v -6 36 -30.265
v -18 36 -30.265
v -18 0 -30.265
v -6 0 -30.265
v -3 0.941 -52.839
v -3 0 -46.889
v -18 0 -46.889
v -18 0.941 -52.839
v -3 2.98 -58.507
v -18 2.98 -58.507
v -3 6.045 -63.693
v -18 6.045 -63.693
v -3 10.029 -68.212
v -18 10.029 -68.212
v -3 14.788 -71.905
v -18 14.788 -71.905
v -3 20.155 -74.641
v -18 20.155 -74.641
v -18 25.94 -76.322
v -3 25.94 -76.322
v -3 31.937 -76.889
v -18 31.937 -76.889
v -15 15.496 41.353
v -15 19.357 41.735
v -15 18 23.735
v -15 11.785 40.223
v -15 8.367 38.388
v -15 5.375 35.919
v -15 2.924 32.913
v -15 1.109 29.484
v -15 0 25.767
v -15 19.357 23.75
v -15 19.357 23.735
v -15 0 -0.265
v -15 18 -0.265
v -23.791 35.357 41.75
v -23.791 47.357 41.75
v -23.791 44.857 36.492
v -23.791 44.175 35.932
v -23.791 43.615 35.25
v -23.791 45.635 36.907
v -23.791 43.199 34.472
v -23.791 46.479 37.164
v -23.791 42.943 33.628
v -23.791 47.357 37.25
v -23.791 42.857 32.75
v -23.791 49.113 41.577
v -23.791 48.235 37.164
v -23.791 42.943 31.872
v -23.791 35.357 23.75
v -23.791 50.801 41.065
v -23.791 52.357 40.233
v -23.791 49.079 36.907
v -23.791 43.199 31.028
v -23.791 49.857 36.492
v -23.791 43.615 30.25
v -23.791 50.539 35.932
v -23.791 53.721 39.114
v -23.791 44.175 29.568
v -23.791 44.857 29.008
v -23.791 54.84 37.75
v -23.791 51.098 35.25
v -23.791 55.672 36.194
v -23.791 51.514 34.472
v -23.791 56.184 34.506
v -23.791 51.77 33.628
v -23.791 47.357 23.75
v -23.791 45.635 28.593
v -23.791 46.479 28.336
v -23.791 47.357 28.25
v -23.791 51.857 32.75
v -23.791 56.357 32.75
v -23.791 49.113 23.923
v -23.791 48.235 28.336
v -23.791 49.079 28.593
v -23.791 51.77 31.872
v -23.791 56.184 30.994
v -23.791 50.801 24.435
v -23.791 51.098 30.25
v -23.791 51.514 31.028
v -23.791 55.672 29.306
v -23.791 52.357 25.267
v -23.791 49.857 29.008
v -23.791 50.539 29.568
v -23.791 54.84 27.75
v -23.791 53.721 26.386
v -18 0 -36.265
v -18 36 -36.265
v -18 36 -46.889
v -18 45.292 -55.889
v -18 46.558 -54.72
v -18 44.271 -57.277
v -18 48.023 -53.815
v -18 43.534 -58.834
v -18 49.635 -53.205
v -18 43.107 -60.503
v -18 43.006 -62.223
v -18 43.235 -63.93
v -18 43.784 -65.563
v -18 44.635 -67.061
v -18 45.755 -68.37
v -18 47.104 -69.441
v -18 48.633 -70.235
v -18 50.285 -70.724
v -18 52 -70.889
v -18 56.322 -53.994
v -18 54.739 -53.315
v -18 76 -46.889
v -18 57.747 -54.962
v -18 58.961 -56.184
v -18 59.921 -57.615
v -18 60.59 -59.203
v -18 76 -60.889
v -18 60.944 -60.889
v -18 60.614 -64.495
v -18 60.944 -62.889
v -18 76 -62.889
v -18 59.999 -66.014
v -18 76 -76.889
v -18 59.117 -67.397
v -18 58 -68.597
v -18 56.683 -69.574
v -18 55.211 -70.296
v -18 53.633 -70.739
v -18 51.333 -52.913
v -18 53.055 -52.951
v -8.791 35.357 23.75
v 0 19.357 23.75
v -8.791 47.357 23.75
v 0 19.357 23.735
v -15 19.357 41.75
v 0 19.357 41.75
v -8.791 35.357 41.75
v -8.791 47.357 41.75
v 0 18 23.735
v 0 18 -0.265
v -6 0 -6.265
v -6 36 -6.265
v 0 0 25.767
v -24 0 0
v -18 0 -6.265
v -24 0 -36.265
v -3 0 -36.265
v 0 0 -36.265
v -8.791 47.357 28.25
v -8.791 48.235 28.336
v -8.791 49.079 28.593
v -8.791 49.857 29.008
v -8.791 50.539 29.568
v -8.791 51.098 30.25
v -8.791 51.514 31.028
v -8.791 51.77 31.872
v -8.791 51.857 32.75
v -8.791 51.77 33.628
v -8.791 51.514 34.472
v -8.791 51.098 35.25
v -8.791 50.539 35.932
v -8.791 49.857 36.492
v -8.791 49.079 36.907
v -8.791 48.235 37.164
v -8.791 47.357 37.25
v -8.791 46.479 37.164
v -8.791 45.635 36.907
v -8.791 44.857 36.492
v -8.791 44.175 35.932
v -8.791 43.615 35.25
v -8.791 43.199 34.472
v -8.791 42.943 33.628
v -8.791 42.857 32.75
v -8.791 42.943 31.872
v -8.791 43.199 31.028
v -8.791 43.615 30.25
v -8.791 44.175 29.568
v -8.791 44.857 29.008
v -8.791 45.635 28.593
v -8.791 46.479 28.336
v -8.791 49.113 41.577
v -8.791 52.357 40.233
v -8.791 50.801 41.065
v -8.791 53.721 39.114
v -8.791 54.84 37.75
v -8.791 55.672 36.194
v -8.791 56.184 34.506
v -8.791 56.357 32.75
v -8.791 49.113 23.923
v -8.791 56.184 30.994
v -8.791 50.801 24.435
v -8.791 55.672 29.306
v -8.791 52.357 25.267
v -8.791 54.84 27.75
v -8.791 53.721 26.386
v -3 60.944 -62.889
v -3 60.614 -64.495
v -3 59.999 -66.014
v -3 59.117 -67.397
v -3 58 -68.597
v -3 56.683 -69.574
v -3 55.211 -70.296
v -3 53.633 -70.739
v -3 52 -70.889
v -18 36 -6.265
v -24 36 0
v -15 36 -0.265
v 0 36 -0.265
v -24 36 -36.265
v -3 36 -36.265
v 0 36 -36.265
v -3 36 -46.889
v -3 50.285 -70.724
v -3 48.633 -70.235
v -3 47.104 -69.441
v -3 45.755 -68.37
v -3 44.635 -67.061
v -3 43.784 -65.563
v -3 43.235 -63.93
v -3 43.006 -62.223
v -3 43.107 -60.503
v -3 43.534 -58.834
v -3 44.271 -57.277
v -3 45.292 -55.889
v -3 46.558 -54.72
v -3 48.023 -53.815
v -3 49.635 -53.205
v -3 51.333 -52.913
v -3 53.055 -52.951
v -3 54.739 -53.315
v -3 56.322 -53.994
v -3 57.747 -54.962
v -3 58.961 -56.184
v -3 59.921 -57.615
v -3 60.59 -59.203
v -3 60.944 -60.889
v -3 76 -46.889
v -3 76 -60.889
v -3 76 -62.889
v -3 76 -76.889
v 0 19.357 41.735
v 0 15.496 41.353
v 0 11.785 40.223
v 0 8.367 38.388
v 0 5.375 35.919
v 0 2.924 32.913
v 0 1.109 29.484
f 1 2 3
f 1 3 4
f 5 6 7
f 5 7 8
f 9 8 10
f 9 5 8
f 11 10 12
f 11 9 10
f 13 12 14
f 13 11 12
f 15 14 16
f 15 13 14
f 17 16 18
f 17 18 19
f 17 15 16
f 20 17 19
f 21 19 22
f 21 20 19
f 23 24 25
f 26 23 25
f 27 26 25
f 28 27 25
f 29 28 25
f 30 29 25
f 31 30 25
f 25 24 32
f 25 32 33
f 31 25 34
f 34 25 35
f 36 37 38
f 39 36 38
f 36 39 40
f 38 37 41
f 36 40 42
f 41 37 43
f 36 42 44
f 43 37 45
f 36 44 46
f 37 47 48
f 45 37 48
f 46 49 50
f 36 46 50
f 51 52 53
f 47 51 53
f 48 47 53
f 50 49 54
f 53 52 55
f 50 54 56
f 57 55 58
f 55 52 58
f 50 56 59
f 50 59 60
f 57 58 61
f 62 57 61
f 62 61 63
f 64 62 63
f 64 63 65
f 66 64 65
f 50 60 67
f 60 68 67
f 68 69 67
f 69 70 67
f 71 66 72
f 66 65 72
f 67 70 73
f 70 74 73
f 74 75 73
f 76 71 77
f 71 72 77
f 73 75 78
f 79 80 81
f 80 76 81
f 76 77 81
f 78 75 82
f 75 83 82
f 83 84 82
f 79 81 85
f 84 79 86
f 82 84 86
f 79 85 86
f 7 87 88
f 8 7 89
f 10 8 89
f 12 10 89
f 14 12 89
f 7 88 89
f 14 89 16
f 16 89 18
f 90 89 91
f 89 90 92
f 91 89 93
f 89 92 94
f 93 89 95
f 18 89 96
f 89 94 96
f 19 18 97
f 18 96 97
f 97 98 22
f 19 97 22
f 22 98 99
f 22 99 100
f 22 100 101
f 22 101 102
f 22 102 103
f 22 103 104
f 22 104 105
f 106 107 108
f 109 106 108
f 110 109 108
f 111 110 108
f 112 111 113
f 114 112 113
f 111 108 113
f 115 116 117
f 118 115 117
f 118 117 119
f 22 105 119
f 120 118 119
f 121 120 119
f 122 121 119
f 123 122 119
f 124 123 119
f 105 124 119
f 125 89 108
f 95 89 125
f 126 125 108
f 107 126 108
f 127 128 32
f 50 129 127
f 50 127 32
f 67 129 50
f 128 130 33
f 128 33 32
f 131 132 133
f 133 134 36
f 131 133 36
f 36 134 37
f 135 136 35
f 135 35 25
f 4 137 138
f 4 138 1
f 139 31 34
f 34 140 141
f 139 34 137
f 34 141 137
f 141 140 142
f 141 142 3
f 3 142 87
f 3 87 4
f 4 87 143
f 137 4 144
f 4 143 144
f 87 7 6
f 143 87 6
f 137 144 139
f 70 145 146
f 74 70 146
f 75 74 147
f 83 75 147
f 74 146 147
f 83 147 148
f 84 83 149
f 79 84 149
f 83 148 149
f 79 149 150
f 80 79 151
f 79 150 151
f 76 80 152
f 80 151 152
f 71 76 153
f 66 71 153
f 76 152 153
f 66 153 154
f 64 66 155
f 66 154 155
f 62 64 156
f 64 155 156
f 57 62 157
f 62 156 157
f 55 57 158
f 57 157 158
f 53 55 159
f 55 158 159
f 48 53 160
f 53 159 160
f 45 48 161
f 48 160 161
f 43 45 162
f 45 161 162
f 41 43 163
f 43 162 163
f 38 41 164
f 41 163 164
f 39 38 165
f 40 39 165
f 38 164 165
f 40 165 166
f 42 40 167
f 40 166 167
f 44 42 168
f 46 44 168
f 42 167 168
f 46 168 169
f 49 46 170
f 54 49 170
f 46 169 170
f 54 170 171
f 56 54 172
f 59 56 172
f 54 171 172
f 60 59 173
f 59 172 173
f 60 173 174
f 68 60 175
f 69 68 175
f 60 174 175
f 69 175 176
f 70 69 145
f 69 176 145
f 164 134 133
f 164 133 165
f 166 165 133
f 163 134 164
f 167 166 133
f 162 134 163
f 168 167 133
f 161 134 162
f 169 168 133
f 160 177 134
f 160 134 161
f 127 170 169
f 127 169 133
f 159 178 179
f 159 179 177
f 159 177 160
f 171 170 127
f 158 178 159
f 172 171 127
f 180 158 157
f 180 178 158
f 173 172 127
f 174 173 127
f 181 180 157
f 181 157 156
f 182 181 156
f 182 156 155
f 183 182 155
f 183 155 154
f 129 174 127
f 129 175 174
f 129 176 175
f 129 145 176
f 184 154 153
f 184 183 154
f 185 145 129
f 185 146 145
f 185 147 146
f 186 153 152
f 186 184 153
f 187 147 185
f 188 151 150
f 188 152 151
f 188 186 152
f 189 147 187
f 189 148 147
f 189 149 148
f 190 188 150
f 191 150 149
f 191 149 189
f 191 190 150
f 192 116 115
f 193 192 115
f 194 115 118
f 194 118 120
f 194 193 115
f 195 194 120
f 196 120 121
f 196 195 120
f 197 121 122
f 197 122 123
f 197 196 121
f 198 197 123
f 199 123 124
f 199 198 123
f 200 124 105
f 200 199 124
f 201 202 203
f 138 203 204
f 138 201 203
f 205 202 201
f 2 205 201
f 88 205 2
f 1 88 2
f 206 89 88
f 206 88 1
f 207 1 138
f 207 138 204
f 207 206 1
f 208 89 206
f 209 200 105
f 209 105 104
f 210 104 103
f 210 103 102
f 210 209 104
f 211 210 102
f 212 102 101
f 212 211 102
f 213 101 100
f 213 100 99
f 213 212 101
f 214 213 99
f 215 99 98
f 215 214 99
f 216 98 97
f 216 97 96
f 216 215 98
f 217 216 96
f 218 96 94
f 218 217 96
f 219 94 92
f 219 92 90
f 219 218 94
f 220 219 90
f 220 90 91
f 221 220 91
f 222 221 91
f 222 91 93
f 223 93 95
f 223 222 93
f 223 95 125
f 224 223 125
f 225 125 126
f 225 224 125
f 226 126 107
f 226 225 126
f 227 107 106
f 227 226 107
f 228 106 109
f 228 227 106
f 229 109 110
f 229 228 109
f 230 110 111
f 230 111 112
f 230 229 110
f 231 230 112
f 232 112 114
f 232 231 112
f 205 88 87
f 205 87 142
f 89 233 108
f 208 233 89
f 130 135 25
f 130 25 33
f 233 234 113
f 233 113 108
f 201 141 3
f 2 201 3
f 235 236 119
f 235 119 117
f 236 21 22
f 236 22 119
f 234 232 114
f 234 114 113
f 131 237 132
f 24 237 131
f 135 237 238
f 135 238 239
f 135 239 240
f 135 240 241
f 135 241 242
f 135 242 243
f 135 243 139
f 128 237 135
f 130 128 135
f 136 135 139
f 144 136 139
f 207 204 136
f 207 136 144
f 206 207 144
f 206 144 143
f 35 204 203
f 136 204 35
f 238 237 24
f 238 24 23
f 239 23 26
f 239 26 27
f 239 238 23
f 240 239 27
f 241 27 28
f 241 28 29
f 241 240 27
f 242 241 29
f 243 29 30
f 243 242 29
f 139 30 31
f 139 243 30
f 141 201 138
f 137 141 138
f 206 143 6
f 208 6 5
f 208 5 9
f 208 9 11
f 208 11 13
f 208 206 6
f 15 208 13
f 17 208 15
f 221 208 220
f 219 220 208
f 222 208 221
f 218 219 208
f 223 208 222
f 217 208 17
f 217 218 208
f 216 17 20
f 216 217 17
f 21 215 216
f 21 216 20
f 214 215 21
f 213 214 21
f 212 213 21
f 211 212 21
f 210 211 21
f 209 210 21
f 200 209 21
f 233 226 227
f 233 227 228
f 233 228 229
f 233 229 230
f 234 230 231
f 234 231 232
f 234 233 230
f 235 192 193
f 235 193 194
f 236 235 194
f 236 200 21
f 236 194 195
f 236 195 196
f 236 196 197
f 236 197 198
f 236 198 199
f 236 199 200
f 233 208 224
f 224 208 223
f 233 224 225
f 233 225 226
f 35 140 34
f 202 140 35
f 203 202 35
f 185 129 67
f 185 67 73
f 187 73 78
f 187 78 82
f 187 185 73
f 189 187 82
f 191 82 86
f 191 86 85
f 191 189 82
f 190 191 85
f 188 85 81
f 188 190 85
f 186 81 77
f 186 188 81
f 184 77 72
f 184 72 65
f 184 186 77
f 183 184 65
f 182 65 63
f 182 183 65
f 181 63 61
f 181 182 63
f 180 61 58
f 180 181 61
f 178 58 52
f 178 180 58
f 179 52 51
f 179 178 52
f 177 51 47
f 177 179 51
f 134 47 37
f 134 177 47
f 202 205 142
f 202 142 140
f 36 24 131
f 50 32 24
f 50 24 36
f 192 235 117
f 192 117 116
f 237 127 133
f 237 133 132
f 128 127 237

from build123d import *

# Parameters (mm, degrees)
BOSS_EXTRUDE1_DEPTH = 15
BOSS_EXTRUDE2_DEPTH = 18
BOSS_EXTRUDE3_DEPTH = 15
SKETCH4_R           = 4.5
CUT_EXTRUDE1_DEPTH  = 15
BOSS_EXTRUDE4_DEPTH = 36
SKETCH6_W           = 12
SKETCH6_H           = 24
CUT_EXTRUDE2_DEPTH  = 61.125389812
SKETCH7_W           = 15
SKETCH7_H           = 10.623328836
BOSS_EXTRUDE5_DEPTH = 36
BOSS_EXTRUDE6_DEPTH = 15


with BuildPart() as part:
    # Sketch1 → Boss-Extrude1 (new body)
    with BuildSketch(Plane(origin=(0, 0, 0), x_dir=(0, 0, -1), z_dir=(1, 0, 0))):
        with BuildLine():
            Line((-25.766620498, 0), (36.265250882, 0))
            Line((36.265250882, 0), (36.265250882, 36))
            Line((36.265250882, 36), (0.265250882, 36))
            Line((0.265250882, 36), (0.265250882, 18))
            Line((0.265250882, 18), (-23.734749118, 18))
            Line((-23.734749118, 18), (-23.734749118, 19.356781067))
            Line((-23.734749118, 19.356781067), (-41.734749118, 19.356781067))
            ThreePointArc((-41.734749118, 19.356781067), (-37.227535866, 6.810206785), (-25.766620498, 0))
        make_face()
    extrude(amount=-BOSS_EXTRUDE1_DEPTH)

    # Sketch2 → Boss-Extrude2 (add)
    with BuildSketch(Plane.XY.offset(23.75)):
        Polygon((-15, 19.356781067), (-23.791342675, 35.356781067), (-23.791342675, 47.356781067), (-8.791342675, 47.356781067), (-8.791342675, 35.356781067), (0, 19.356781067), align=None)
    extrude(amount=BOSS_EXTRUDE2_DEPTH)

    # Sketch3 → Boss-Extrude3 (add)
    with BuildSketch(Plane(origin=(-8.791342675, 0, 0), x_dir=(0, 0, -1), z_dir=(1, 0, 0))):
        with BuildLine():
            Line((-41.75, 47.356781067), (-23.75, 47.356781067))
            ThreePointArc((-23.75, 47.356781067), (-32.75, 56.356781067), (-41.75, 47.356781067))
        make_face()
    extrude(amount=-BOSS_EXTRUDE3_DEPTH)

    # Sketch4 → Cut-Extrude1 (cut)
    with BuildSketch(Plane(origin=(-8.791342675, 0, 0), x_dir=(0, 0, -1), z_dir=(1, 0, 0))):
        with Locations((-32.75, 47.356781067)):
            Circle(SKETCH4_R)
    extrude(amount=-CUT_EXTRUDE1_DEPTH, mode=Mode.SUBTRACT)


with BuildPart() as body_2:
    # Sketch5 → Boss-Extrude4 (new body)
    with BuildSketch(Plane(origin=(0, 36, 0), x_dir=(1, 0, 0), z_dir=(0, 1, 0))):
        Polygon((-15, 36.265250882), (-24, 36.265250882), (-24, 0), (-15, 0.265250882), align=None)
    extrude(amount=-BOSS_EXTRUDE4_DEPTH)


with BuildPart() as cut_extrude2_tool:
    # Sketch6 → Cut-Extrude2 (new, through all)
    with BuildSketch(Plane(origin=(0, 36, 0), x_dir=(1, 0, 0), z_dir=(0, 1, 0))):
        with Locations((-12, 18.265250882)):
            Rectangle(SKETCH6_W, SKETCH6_H)
    extrude(amount=-CUT_EXTRUDE2_DEPTH)


with BuildPart() as part_1:
    add(part.part)

    # Cut-Extrude2: cut by cut_extrude2_tool
    add(cut_extrude2_tool.part, mode=Mode.SUBTRACT)



with BuildPart() as body_2_1:
    add(body_2.part)

    # Cut-Extrude2: cut by cut_extrude2_tool
    add(cut_extrude2_tool.part, mode=Mode.SUBTRACT)


with BuildPart() as part_2:
    add(part_1.part)

    add(body_2_1.part)  # Boss-Extrude5 merges body 2
    # Sketch7 → Boss-Extrude5 (add)
    with BuildSketch(Plane(origin=(0, 36, 0), x_dir=(1, 0, 0), z_dir=(0, 1, 0))):
        with Locations((-10.5, 41.5769153)):
            Rectangle(SKETCH7_W, SKETCH7_H)
    extrude(amount=-BOSS_EXTRUDE5_DEPTH)

    # Sketch9 → Boss-Extrude6 (add)
    with BuildSketch(Plane(origin=(-3, 0, 0), x_dir=(0, 0, -1), z_dir=(1, 0, 0))):
        with BuildLine():
            Line((46.888579718, 76), (46.888579718, 36))
            Line((46.888579718, 36), (46.888579718, 0))
            ThreePointArc((46.888579718, 0), (68.212387297, 10.028536545), (76.888579718, 31.937438845))
            Line((76.888579718, 31.937438845), (76.888579718, 76))
            Line((76.888579718, 76), (62.888579718, 76))
            Line((62.888579718, 76), (62.888579718, 60.94427191))
            ThreePointArc((62.888579718, 60.94427191), (68.59678365, 58), (70.888579718, 52))
            ThreePointArc((70.888579718, 52), (55.888579718, 45.291796068), (60.888579718, 60.94427191))
            Line((60.888579718, 60.94427191), (60.888579718, 76))
            Line((60.888579718, 76), (46.888579718, 76))
        make_face()
    extrude(amount=-BOSS_EXTRUDE6_DEPTH)


solid = part_2.part
